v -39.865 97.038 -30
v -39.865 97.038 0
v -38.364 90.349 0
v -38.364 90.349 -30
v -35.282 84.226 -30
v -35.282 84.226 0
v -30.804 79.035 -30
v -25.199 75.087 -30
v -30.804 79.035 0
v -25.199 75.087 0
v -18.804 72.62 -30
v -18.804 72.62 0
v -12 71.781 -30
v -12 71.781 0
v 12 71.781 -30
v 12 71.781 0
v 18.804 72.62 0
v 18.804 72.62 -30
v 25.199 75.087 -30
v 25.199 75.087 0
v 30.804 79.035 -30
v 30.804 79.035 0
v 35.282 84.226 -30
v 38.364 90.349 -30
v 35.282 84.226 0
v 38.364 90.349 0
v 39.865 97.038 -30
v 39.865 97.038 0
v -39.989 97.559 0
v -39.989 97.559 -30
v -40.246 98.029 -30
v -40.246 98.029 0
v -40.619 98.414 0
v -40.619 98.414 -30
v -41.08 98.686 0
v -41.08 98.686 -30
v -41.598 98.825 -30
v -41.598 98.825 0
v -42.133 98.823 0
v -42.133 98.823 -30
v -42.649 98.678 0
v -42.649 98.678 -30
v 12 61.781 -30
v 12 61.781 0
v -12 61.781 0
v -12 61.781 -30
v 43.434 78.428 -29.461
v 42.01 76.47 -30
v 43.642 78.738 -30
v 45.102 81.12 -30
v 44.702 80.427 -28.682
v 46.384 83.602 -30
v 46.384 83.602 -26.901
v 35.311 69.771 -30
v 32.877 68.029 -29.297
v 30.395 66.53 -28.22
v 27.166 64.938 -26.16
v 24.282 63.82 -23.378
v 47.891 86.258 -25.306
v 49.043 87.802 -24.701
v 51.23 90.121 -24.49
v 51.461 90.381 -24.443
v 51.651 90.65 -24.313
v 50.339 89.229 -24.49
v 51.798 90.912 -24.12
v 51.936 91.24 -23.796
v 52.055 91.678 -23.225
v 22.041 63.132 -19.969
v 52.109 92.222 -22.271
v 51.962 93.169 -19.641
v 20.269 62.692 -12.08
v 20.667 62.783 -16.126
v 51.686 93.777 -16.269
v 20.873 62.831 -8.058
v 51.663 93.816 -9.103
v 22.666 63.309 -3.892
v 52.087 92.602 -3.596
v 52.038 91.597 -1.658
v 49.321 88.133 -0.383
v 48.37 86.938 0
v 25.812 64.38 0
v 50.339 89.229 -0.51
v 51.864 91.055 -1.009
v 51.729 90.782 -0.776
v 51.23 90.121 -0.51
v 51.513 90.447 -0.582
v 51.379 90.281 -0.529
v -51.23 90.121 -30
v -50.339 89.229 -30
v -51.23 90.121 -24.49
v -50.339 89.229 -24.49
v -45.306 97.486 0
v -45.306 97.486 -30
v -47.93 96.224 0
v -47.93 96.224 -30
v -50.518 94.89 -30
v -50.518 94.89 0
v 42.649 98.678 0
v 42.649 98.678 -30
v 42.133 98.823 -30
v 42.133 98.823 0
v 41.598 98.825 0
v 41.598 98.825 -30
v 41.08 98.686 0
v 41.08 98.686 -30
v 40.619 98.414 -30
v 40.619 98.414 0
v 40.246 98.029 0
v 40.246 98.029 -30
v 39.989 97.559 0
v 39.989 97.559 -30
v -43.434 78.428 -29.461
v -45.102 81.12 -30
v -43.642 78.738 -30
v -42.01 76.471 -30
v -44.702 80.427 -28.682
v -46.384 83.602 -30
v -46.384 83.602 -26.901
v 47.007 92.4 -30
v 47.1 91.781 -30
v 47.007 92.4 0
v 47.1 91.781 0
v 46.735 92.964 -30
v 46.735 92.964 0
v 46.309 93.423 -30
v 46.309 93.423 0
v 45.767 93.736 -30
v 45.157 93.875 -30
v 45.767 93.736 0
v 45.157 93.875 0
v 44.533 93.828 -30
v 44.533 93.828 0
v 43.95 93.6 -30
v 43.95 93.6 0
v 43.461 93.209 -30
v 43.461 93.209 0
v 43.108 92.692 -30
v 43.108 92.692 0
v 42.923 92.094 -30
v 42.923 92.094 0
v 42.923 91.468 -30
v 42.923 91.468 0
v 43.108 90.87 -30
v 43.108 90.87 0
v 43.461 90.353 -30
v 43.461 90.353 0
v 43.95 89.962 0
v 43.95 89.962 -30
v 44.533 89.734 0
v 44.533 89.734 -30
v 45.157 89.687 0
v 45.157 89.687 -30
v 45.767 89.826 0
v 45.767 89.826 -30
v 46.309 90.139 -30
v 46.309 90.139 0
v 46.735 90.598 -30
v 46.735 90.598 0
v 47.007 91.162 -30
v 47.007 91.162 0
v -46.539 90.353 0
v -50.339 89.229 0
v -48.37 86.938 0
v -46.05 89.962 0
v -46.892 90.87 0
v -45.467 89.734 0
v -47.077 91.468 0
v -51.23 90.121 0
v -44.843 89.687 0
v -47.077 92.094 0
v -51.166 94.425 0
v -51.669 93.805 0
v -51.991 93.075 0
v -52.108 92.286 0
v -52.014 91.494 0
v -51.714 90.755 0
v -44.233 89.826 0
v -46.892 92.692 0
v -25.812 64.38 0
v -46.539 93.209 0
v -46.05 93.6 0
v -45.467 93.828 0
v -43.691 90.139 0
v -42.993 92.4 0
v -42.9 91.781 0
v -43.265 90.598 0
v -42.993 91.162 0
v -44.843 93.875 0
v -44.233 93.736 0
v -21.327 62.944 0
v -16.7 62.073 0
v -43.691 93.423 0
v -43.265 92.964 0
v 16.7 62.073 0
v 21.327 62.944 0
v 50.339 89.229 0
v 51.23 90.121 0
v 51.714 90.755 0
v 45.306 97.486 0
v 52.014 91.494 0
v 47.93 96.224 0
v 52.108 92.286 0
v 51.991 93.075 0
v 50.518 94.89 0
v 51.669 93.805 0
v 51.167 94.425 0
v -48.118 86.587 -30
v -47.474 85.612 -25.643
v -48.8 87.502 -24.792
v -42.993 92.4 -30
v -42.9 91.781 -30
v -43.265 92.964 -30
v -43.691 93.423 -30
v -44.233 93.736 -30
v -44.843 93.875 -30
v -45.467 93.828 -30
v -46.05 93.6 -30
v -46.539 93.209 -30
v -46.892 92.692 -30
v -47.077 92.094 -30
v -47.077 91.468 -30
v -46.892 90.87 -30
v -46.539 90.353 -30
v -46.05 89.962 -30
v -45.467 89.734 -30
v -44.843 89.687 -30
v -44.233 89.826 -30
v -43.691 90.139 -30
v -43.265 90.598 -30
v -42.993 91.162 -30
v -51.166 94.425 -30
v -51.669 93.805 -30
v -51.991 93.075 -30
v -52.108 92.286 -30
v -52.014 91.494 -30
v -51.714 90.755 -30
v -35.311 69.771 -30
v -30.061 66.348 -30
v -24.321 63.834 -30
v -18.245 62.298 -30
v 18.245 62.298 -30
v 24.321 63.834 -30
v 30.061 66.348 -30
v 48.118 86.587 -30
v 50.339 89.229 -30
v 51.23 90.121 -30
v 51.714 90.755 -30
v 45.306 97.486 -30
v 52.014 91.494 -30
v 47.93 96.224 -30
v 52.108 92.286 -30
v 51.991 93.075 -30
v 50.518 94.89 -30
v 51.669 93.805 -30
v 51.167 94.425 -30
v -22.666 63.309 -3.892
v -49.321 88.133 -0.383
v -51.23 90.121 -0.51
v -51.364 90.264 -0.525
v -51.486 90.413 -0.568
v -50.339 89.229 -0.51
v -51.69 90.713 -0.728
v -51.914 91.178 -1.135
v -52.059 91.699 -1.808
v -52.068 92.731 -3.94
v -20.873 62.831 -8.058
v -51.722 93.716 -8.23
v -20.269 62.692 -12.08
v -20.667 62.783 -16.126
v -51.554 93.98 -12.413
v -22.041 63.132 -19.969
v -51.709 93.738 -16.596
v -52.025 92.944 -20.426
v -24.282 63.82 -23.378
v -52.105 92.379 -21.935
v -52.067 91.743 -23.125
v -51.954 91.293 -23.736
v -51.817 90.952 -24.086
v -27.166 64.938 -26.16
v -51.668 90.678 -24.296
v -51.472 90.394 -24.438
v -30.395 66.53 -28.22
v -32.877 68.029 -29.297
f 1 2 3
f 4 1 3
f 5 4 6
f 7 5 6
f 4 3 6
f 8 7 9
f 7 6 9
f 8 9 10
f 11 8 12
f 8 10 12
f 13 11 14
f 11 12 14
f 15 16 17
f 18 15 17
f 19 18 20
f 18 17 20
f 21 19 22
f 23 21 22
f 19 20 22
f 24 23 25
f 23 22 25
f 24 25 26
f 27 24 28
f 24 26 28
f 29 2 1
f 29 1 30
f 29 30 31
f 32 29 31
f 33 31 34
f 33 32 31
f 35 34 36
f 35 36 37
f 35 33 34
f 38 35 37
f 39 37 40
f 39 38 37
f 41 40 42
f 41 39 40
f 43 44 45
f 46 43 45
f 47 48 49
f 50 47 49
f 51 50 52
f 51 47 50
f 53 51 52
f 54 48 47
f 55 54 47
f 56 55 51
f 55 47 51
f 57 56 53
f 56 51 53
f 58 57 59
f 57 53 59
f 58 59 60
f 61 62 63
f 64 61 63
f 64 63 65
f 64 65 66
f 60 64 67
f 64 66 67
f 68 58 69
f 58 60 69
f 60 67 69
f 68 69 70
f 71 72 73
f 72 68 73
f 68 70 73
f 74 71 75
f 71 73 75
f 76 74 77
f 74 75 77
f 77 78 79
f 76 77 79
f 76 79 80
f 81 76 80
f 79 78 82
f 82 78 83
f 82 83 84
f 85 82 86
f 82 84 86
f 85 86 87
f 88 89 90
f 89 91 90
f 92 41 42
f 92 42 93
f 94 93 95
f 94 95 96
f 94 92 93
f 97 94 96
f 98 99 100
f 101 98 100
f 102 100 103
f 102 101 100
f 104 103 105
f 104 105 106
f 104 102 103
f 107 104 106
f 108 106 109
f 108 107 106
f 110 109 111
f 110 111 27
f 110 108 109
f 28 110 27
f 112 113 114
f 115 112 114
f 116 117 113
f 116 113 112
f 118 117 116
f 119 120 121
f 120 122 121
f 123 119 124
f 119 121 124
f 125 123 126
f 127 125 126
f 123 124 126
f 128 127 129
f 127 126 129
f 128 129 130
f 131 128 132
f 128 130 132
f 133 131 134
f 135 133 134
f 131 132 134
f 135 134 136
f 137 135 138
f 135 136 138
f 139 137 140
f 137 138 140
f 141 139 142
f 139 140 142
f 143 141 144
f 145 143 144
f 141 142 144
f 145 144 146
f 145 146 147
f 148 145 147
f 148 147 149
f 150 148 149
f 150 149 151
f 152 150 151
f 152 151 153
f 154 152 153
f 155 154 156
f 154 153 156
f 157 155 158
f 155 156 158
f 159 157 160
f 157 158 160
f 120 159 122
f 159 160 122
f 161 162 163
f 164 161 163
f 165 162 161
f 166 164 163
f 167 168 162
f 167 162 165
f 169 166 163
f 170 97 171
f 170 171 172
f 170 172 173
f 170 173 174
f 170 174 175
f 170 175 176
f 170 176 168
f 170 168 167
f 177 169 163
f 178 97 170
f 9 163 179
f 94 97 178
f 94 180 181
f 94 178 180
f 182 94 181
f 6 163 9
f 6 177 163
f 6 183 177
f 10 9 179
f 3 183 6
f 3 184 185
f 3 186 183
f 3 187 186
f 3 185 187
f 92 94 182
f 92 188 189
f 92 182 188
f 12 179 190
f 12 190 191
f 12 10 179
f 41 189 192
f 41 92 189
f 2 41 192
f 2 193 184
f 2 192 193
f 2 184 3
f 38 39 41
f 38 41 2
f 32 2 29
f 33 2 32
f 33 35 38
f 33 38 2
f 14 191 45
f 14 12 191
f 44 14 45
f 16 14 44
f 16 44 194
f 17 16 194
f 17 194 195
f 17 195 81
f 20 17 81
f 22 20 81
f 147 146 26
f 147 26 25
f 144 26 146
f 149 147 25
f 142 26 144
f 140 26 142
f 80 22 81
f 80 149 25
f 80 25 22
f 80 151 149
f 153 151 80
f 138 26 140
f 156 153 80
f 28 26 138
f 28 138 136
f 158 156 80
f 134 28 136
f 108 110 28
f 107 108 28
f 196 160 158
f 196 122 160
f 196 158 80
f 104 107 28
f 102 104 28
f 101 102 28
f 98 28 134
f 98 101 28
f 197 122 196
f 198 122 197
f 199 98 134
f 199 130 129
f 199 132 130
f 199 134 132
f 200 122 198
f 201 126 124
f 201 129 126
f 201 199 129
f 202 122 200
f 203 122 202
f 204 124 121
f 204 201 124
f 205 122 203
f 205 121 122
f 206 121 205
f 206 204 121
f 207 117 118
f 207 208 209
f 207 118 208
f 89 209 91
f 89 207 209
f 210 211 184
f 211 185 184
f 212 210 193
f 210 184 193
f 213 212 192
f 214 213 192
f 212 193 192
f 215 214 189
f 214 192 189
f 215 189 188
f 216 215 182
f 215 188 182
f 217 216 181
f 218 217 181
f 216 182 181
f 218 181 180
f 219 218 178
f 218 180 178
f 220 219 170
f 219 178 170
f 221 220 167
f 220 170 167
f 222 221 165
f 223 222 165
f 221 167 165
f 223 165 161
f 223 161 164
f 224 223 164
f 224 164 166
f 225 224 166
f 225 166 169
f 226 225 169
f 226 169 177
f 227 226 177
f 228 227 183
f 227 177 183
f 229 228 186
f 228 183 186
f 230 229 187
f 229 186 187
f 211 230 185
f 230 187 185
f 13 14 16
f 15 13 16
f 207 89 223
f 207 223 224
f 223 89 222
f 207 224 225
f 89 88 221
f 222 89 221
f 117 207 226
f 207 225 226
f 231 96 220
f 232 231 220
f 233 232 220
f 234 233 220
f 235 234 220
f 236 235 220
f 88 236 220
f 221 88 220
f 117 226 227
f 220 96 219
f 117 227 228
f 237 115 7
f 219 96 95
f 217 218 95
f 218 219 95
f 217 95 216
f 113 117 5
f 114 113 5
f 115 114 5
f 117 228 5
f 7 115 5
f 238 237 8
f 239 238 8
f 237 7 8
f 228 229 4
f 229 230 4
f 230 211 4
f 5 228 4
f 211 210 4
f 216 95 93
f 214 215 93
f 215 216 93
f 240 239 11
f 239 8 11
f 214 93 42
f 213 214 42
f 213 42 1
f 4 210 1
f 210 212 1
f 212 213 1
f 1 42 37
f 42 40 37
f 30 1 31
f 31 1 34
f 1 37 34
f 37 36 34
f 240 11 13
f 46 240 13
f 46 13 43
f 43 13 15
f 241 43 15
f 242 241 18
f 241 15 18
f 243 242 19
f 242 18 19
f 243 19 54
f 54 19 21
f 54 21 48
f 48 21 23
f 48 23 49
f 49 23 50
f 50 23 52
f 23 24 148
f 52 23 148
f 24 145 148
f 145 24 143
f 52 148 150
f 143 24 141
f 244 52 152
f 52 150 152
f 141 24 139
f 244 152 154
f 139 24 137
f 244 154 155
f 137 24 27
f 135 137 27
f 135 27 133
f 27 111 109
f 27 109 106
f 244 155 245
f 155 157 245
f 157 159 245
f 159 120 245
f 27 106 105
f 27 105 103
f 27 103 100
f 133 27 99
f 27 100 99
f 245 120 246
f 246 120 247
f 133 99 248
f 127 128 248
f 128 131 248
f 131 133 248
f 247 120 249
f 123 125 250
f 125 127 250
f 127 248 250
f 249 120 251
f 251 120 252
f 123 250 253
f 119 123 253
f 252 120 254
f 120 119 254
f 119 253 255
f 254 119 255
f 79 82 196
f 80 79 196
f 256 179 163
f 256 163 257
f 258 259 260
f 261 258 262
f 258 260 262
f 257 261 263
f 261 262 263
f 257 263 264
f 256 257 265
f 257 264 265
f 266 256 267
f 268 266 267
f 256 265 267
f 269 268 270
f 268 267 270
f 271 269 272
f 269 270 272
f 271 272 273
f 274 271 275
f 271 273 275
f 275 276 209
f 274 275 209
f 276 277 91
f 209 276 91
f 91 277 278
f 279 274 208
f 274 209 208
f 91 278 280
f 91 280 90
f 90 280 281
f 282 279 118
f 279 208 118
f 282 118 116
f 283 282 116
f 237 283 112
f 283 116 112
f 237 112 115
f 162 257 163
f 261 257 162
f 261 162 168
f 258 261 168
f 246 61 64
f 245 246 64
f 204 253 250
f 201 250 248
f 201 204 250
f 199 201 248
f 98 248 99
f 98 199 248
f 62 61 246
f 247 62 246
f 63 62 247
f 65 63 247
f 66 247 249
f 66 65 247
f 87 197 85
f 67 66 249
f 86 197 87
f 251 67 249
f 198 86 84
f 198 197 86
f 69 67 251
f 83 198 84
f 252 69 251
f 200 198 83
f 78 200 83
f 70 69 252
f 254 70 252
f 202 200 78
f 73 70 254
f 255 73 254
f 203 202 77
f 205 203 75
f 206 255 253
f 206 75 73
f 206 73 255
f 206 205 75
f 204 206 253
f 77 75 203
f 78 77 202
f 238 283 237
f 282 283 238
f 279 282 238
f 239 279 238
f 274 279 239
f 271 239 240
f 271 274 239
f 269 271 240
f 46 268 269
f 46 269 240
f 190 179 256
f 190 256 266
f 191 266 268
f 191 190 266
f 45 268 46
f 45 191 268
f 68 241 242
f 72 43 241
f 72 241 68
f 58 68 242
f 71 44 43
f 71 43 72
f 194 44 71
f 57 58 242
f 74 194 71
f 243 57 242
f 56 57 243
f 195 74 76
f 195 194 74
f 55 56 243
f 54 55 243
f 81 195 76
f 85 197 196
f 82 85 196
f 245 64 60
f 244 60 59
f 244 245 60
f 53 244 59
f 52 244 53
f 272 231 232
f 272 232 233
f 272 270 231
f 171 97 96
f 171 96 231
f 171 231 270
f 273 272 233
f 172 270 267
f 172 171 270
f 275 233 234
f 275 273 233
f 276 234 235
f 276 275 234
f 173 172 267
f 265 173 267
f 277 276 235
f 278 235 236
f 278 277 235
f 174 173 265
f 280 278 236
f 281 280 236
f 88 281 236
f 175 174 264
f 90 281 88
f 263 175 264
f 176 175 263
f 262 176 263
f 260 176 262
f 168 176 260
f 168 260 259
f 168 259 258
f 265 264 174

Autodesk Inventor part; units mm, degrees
ref_plane "YZ Plane" through (0, 0, 0) normal (1, 0, 0) x (0, 1, 0)
ref_plane "XZ Plane" through (0, 0, 0) normal (0, 1, 0) x (-1, 0, 0)
ref_plane "XY Plane" through (0, 0, 0) normal (0, 0, 1) x (1, 0, 0)
sketch "Skizze6" plane through (0, 0, 0) normal (0, 0, 1) x (1, 0, 0)
  arc A0 (21.4454, -27.1023) -> (20.0312, -26.5165) centre (20.0312, -28.5165) ccw
  line L0 (20.0312, -26.5165) -> (-20.0312, -26.5165)
  arc A1 (-20.0312, -26.5165) -> (-21.4454, -27.1023) centre (-20.0312, -28.5165) ccw
  line L1 (-21.4454, -27.1023) -> (-51.9723, -57.6292)
  line L2 (-51.9723, -57.6292) -> (-42.4264, -67.1751)
  arc A2 (-38.3776, -89.6293) -> (-42.4264, -67.1751) centre (-56.5685, -81.3173) ccw
  arc A3 (-38.3776, -89.6293) -> (38.3776, -89.6293) centre (0, 0) ccw
  arc A4 (42.4264, -67.1751) -> (38.3776, -89.6293) centre (56.5685, -81.3173) ccw
  line L3 (42.4264, -67.1751) -> (51.9724, -57.6292)
  line L4 (51.9724, -57.6292) -> (21.4454, -27.1023)
  circle A5 centre (37.8302, -37.8302) radius 1.65
  circle A6 centre (37.8302, 37.8302) radius 1.65
  circle A7 centre (-37.8302, -37.8302) radius 1.65
  circle A8 centre (-37.8302, 37.8302) radius 1.65
  circle A9 centre (-22.7665, 22.7665) radius 1.6
  circle A10 centre (22.7665, 22.7665) radius 1.6
  circle A11 centre (22.7665, -22.7665) radius 1.6
  circle A12 centre (-22.7665, -22.7665) radius 1.6
  line L5 (19.0165, -19.0165) -> (19.0165, 19.0165)
  line L6 (19.0165, 19.0165) -> (-19.0165, 19.0165)
  line L7 (-19.0165, 19.0165) -> (-19.0165, -19.0165)
  line L8 (-19.0165, -19.0165) -> (19.0165, -19.0165)
  line L9 (26.5165, -20.8596) -> (57.6292, -51.9723)
  line L10 (57.6292, -51.9723) -> (67.1751, -42.4264)
  arc A13 (89.6293, -38.3776) -> (67.1751, -42.4264) centre (81.3173, -56.5685) ccw
  arc A14 (89.6293, -38.3776) -> (89.6293, 38.3776) centre (0, 0) ccw
  arc A15 (67.1751, 42.4264) -> (89.6293, 38.3776) centre (81.3173, 56.5685) ccw
  line L11 (67.1751, 42.4264) -> (57.6292, 51.9724)
  line L12 (57.6292, 51.9724) -> (26.5165, 20.8597)
  line L13 (26.5165, 20.8597) -> (26.5165, -20.8596)
  line L14 (-26.5165, 20.8596) -> (-57.6292, 51.9723)
  line L15 (-57.6292, 51.9723) -> (-67.1751, 42.4264)
  arc A16 (-89.6293, 38.3776) -> (-67.1751, 42.4264) centre (-81.3173, 56.5685) ccw
  arc A17 (-89.6293, 38.3776) -> (-89.6293, -38.3776) centre (0, 0) ccw
  arc A18 (-67.1751, -42.4264) -> (-89.6293, -38.3776) centre (-81.3173, -56.5685) ccw
  line L16 (-67.1751, -42.4264) -> (-57.6292, -51.9724)
  line L17 (-57.6292, -51.9724) -> (-26.5165, -20.8597)
  line L18 (-26.5165, -20.8597) -> (-26.5165, 20.8596)
  circle A19 centre (-44.3776, -92.6293) radius 1.6
  circle A20 centre (92.6293, 44.3776) radius 1.6
  circle A21 centre (-92.6293, -44.3776) radius 1.6
  circle A22 centre (44.3776, -92.6293) radius 1.6
  circle A23 centre (92.6293, -44.3776) radius 1.6
  circle A24 centre (-92.6293, 44.3776) radius 1.6
  circle A25 centre (45, 91.781) radius 1.6
  circle A26 centre (-45, 91.781) radius 1.6
  circle A27 centre (-67.8822, -48.7904) radius 1.6
  circle A28 centre (-48.7904, -67.8823) radius 1.6
  circle A29 centre (48.7904, -67.8822) radius 1.6
  circle A30 centre (67.8823, -48.7904) radius 1.6
  circle A31 centre (-67.8823, 48.7904) radius 1.6
  circle A32 centre (67.8822, 48.7904) radius 1.6
  circle A33 centre (48.7904, 67.8823) radius 1.6
  circle A34 centre (-48.7904, 67.8822) radius 1.6
  arc A35 (12, 61.781) -> (38.5642, 72.6085) centre (12, 99.781) ccw
  line L19 (12, 61.781) -> (-12, 61.781)
  arc A36 (-38.5642, 72.6085) -> (-12, 61.781) centre (-12, 99.781) ccw
  arc A37 (-42.4264, 67.1751) -> (-38.5642, 72.6085) centre (-56.5685, 81.3173) ccw
  line L20 (-42.4264, 67.1751) -> (-51.9724, 57.6292)
  line L21 (-51.9724, 57.6292) -> (-20.8597, 26.5165)
  line L22 (-20.8597, 26.5165) -> (20.8596, 26.5165)
  line L23 (20.8596, 26.5165) -> (51.9723, 57.6292)
  line L24 (51.9723, 57.6292) -> (42.4264, 67.1751)
  arc A38 (38.5642, 72.6085) -> (42.4264, 67.1751) centre (56.5685, 81.3173) ccw
  line L25 (-12, 71.781) -> (12, 71.781)
  arc A39 (12, 71.781) -> (39.8653, 97.0378) centre (12, 99.781) ccw
  arc A40 (42.6492, 98.6778) -> (39.8653, 97.0378) centre (41.8557, 96.8419) ccw
  arc A41 (50.5184, 94.8902) -> (42.6492, 98.6778) centre (0, 0) ccw
  arc A42 (51.2299, 90.1207) -> (50.5184, 94.8902) centre (49.1086, 92.2421) ccw
  line L26 (51.2299, 90.1207) -> (49.4975, 88.3883)
  arc A43 (49.4975, 88.3883) -> (49.4975, 74.2462) centre (56.5685, 81.3173) ccw
  line L27 (49.4975, 74.2462) -> (74.2462, 49.4975)
  arc A44 (74.2462, 49.4975) -> (88.3884, 49.4975) centre (81.3173, 56.5685) ccw
  line L28 (88.3884, 49.4975) -> (90.1208, 51.2299)
  arc A45 (94.8902, 50.5184) -> (90.1208, 51.2299) centre (92.2421, 49.1086) ccw
  arc A46 (94.8902, -50.5184) -> (94.8902, 50.5184) centre (0, 0) ccw
  arc A47 (90.1208, -51.2299) -> (94.8902, -50.5184) centre (92.2421, -49.1086) ccw
  line L29 (90.1208, -51.2299) -> (88.3883, -49.4975)
  arc A48 (88.3883, -49.4975) -> (74.2462, -49.4975) centre (81.3173, -56.5685) ccw
  line L30 (74.2462, -49.4975) -> (49.4975, -74.2462)
  arc A49 (49.4975, -74.2462) -> (49.4975, -88.3883) centre (56.5685, -81.3173) ccw
  line L31 (49.4975, -88.3883) -> (51.2299, -90.1207)
  arc A50 (50.5184, -94.8902) -> (51.2299, -90.1207) centre (49.1086, -92.2421) ccw
  arc A51 (-50.5184, -94.8902) -> (50.5184, -94.8902) centre (0, 0) ccw
  arc A52 (-51.2299, -90.1208) -> (-50.5184, -94.8902) centre (-49.1086, -92.2421) ccw
  line L32 (-51.2299, -90.1208) -> (-49.4975, -88.3883)
  arc A53 (-49.4975, -88.3883) -> (-49.4975, -74.2462) centre (-56.5685, -81.3173) ccw
  line L33 (-49.4975, -74.2462) -> (-74.2462, -49.4975)
  arc A54 (-74.2462, -49.4975) -> (-88.3883, -49.4975) centre (-81.3173, -56.5685) ccw
  line L34 (-88.3883, -49.4975) -> (-90.1207, -51.2299)
  arc A55 (-94.8902, -50.5184) -> (-90.1207, -51.2299) centre (-92.2421, -49.1086) ccw
  arc A56 (-94.8902, 50.5184) -> (-94.8902, -50.5184) centre (0, 0) ccw
  arc A57 (-90.1208, 51.2299) -> (-94.8902, 50.5184) centre (-92.2421, 49.1086) ccw
  line L35 (-90.1208, 51.2299) -> (-88.3883, 49.4975)
  arc A58 (-88.3883, 49.4975) -> (-74.2462, 49.4975) centre (-81.3173, 56.5685) ccw
  line L36 (-74.2462, 49.4975) -> (-49.4975, 74.2462)
  arc A59 (-49.4975, 74.2462) -> (-49.4975, 88.3883) centre (-56.5685, 81.3173) ccw
  line L37 (-49.4975, 88.3883) -> (-51.2299, 90.1207)
  arc A60 (-50.5184, 94.8902) -> (-51.2299, 90.1207) centre (-49.1086, 92.2421) ccw
  arc A61 (-42.6492, 98.6778) -> (-50.5184, 94.8902) centre (0, 0) ccw
  arc A62 (-39.8653, 97.0378) -> (-42.6492, 98.6778) centre (-41.8557, 96.8419) ccw
  arc A63 (-39.8653, 97.0378) -> (-12, 71.781) centre (-12, 99.781) ccw
  arc A64 (-47.6003, 86.4911) -> (-12, 61.781) centre (-12, 99.781) ccw
  line L38 (-49.4975, 88.3883) -> (-47.6003, 86.4911)
  line L39 (0, 71.781) -> (0, 61.781) construction
  arc A65 (12, 61.781) -> (47.6003, 86.4911) centre (12, 99.781) ccw
  line L40 (49.4975, 88.3883) -> (47.6003, 86.4911)
  point P0 (0, 0)
  point P1 (0, 0)
  point P2 (38.5642, 72.6085)
extrude "Extrusion4" add sketch "Skizze6" against normal blind 30 contours L19 A36 A64 L38 L37 A60 A61 A62 A63 L25 A39 A40 A41 A42 L26 L40 A65 A35
fillet "Rundung2" radius 20 2 edges at (47.6003, 86.4911, -15) (-47.6003, 86.4911, -15)
sketch "Skizze7" plane through (0, 0, 0) normal (0, 0, 1) x (1, 0, 0)
  line L0 (0, 0) -> (-29.0841, 0) construction
  line L1 (0, 0) -> (-84.8528, 84.8528)
  line L2 (-111.3693, 68.9429) -> (-68.9429, 111.3693)
  line L3 (-68.9429, 111.3693) -> (-58.3363, 100.7627)
  line L4 (-58.3363, 100.7627) -> (-100.7627, 58.3363)
  line L5 (-100.7627, 58.3363) -> (-111.3693, 68.9429)
  line L6 (-111.3693, 68.9429) -> (-58.3363, 100.7627) construction
  line L7 (-68.9429, 111.3693) -> (-100.7627, 58.3363) construction
  dimension "d19" = 45
  dimension "d20" = 120
  dimension "d21" = 60
  dimension "d22" = 15
extrude "Extrusion5" add sketch "Skizze7" against normal blind 30
sketch "Skizze8" plane through (-68.9429, 111.3693, -30) normal (-0.7071, 0.7071, 0) x (-0.7071, -0.7071, 0)
  line L0 (60, 0) -> (0, 0) projected
  line L1 (30, 0) -> (30, 17.5)
  circle A0 centre (30, 17.5) radius 30
  line L2 (0, 30) -> (60, 30) projected
  line L3 (0, 30) -> (60, 30)
  line L4 (60, 30) -> (60, 0)
  line L5 (60, 0) -> (0, 0)
  line L6 (0, 0) -> (0, 30)
  point P0 (30, 30)
  dimension "d25" = 17.5
  dimension "d26" = 60
extrude "Extrusion6" cut sketch "Skizze8" against normal up to surface (15 mm away) contours L0 A0 L4 | L0 A0 L2 | A0 L2 L4 | L0 L6 A0 | L6 L2 A0
extrude "Extrusion7" cut sketch "Skizze8" against normal blind 100 contours A0 L0 | L0 A0 L2 | L2 A0
mirror "Spiegeln1" about plane through (0, 0, 0) normal (1, 0, 0) of "Extrusion7"
sketch "Skizze9" plane through (0, 0, 0) normal (0, 0, 1) x (1, 0, 0)
  circle A0 centre (45, 91.781) radius 1.6 projected
  circle A1 centre (45, 91.781) radius 2.1
  circle A2 centre (-45, 91.781) radius 1.6 projected
  circle A3 centre (-45, 91.781) radius 2.1
  point P0 (0, 0)
  dimension "d31" = 4.2
  dimension "d32" = 4.2
extrude "Extrusion8" cut sketch "Skizze9" against normal up to surface (30 mm away) contours A0 | A1 | A2 | A3
properties part number "Ballkuhle"
